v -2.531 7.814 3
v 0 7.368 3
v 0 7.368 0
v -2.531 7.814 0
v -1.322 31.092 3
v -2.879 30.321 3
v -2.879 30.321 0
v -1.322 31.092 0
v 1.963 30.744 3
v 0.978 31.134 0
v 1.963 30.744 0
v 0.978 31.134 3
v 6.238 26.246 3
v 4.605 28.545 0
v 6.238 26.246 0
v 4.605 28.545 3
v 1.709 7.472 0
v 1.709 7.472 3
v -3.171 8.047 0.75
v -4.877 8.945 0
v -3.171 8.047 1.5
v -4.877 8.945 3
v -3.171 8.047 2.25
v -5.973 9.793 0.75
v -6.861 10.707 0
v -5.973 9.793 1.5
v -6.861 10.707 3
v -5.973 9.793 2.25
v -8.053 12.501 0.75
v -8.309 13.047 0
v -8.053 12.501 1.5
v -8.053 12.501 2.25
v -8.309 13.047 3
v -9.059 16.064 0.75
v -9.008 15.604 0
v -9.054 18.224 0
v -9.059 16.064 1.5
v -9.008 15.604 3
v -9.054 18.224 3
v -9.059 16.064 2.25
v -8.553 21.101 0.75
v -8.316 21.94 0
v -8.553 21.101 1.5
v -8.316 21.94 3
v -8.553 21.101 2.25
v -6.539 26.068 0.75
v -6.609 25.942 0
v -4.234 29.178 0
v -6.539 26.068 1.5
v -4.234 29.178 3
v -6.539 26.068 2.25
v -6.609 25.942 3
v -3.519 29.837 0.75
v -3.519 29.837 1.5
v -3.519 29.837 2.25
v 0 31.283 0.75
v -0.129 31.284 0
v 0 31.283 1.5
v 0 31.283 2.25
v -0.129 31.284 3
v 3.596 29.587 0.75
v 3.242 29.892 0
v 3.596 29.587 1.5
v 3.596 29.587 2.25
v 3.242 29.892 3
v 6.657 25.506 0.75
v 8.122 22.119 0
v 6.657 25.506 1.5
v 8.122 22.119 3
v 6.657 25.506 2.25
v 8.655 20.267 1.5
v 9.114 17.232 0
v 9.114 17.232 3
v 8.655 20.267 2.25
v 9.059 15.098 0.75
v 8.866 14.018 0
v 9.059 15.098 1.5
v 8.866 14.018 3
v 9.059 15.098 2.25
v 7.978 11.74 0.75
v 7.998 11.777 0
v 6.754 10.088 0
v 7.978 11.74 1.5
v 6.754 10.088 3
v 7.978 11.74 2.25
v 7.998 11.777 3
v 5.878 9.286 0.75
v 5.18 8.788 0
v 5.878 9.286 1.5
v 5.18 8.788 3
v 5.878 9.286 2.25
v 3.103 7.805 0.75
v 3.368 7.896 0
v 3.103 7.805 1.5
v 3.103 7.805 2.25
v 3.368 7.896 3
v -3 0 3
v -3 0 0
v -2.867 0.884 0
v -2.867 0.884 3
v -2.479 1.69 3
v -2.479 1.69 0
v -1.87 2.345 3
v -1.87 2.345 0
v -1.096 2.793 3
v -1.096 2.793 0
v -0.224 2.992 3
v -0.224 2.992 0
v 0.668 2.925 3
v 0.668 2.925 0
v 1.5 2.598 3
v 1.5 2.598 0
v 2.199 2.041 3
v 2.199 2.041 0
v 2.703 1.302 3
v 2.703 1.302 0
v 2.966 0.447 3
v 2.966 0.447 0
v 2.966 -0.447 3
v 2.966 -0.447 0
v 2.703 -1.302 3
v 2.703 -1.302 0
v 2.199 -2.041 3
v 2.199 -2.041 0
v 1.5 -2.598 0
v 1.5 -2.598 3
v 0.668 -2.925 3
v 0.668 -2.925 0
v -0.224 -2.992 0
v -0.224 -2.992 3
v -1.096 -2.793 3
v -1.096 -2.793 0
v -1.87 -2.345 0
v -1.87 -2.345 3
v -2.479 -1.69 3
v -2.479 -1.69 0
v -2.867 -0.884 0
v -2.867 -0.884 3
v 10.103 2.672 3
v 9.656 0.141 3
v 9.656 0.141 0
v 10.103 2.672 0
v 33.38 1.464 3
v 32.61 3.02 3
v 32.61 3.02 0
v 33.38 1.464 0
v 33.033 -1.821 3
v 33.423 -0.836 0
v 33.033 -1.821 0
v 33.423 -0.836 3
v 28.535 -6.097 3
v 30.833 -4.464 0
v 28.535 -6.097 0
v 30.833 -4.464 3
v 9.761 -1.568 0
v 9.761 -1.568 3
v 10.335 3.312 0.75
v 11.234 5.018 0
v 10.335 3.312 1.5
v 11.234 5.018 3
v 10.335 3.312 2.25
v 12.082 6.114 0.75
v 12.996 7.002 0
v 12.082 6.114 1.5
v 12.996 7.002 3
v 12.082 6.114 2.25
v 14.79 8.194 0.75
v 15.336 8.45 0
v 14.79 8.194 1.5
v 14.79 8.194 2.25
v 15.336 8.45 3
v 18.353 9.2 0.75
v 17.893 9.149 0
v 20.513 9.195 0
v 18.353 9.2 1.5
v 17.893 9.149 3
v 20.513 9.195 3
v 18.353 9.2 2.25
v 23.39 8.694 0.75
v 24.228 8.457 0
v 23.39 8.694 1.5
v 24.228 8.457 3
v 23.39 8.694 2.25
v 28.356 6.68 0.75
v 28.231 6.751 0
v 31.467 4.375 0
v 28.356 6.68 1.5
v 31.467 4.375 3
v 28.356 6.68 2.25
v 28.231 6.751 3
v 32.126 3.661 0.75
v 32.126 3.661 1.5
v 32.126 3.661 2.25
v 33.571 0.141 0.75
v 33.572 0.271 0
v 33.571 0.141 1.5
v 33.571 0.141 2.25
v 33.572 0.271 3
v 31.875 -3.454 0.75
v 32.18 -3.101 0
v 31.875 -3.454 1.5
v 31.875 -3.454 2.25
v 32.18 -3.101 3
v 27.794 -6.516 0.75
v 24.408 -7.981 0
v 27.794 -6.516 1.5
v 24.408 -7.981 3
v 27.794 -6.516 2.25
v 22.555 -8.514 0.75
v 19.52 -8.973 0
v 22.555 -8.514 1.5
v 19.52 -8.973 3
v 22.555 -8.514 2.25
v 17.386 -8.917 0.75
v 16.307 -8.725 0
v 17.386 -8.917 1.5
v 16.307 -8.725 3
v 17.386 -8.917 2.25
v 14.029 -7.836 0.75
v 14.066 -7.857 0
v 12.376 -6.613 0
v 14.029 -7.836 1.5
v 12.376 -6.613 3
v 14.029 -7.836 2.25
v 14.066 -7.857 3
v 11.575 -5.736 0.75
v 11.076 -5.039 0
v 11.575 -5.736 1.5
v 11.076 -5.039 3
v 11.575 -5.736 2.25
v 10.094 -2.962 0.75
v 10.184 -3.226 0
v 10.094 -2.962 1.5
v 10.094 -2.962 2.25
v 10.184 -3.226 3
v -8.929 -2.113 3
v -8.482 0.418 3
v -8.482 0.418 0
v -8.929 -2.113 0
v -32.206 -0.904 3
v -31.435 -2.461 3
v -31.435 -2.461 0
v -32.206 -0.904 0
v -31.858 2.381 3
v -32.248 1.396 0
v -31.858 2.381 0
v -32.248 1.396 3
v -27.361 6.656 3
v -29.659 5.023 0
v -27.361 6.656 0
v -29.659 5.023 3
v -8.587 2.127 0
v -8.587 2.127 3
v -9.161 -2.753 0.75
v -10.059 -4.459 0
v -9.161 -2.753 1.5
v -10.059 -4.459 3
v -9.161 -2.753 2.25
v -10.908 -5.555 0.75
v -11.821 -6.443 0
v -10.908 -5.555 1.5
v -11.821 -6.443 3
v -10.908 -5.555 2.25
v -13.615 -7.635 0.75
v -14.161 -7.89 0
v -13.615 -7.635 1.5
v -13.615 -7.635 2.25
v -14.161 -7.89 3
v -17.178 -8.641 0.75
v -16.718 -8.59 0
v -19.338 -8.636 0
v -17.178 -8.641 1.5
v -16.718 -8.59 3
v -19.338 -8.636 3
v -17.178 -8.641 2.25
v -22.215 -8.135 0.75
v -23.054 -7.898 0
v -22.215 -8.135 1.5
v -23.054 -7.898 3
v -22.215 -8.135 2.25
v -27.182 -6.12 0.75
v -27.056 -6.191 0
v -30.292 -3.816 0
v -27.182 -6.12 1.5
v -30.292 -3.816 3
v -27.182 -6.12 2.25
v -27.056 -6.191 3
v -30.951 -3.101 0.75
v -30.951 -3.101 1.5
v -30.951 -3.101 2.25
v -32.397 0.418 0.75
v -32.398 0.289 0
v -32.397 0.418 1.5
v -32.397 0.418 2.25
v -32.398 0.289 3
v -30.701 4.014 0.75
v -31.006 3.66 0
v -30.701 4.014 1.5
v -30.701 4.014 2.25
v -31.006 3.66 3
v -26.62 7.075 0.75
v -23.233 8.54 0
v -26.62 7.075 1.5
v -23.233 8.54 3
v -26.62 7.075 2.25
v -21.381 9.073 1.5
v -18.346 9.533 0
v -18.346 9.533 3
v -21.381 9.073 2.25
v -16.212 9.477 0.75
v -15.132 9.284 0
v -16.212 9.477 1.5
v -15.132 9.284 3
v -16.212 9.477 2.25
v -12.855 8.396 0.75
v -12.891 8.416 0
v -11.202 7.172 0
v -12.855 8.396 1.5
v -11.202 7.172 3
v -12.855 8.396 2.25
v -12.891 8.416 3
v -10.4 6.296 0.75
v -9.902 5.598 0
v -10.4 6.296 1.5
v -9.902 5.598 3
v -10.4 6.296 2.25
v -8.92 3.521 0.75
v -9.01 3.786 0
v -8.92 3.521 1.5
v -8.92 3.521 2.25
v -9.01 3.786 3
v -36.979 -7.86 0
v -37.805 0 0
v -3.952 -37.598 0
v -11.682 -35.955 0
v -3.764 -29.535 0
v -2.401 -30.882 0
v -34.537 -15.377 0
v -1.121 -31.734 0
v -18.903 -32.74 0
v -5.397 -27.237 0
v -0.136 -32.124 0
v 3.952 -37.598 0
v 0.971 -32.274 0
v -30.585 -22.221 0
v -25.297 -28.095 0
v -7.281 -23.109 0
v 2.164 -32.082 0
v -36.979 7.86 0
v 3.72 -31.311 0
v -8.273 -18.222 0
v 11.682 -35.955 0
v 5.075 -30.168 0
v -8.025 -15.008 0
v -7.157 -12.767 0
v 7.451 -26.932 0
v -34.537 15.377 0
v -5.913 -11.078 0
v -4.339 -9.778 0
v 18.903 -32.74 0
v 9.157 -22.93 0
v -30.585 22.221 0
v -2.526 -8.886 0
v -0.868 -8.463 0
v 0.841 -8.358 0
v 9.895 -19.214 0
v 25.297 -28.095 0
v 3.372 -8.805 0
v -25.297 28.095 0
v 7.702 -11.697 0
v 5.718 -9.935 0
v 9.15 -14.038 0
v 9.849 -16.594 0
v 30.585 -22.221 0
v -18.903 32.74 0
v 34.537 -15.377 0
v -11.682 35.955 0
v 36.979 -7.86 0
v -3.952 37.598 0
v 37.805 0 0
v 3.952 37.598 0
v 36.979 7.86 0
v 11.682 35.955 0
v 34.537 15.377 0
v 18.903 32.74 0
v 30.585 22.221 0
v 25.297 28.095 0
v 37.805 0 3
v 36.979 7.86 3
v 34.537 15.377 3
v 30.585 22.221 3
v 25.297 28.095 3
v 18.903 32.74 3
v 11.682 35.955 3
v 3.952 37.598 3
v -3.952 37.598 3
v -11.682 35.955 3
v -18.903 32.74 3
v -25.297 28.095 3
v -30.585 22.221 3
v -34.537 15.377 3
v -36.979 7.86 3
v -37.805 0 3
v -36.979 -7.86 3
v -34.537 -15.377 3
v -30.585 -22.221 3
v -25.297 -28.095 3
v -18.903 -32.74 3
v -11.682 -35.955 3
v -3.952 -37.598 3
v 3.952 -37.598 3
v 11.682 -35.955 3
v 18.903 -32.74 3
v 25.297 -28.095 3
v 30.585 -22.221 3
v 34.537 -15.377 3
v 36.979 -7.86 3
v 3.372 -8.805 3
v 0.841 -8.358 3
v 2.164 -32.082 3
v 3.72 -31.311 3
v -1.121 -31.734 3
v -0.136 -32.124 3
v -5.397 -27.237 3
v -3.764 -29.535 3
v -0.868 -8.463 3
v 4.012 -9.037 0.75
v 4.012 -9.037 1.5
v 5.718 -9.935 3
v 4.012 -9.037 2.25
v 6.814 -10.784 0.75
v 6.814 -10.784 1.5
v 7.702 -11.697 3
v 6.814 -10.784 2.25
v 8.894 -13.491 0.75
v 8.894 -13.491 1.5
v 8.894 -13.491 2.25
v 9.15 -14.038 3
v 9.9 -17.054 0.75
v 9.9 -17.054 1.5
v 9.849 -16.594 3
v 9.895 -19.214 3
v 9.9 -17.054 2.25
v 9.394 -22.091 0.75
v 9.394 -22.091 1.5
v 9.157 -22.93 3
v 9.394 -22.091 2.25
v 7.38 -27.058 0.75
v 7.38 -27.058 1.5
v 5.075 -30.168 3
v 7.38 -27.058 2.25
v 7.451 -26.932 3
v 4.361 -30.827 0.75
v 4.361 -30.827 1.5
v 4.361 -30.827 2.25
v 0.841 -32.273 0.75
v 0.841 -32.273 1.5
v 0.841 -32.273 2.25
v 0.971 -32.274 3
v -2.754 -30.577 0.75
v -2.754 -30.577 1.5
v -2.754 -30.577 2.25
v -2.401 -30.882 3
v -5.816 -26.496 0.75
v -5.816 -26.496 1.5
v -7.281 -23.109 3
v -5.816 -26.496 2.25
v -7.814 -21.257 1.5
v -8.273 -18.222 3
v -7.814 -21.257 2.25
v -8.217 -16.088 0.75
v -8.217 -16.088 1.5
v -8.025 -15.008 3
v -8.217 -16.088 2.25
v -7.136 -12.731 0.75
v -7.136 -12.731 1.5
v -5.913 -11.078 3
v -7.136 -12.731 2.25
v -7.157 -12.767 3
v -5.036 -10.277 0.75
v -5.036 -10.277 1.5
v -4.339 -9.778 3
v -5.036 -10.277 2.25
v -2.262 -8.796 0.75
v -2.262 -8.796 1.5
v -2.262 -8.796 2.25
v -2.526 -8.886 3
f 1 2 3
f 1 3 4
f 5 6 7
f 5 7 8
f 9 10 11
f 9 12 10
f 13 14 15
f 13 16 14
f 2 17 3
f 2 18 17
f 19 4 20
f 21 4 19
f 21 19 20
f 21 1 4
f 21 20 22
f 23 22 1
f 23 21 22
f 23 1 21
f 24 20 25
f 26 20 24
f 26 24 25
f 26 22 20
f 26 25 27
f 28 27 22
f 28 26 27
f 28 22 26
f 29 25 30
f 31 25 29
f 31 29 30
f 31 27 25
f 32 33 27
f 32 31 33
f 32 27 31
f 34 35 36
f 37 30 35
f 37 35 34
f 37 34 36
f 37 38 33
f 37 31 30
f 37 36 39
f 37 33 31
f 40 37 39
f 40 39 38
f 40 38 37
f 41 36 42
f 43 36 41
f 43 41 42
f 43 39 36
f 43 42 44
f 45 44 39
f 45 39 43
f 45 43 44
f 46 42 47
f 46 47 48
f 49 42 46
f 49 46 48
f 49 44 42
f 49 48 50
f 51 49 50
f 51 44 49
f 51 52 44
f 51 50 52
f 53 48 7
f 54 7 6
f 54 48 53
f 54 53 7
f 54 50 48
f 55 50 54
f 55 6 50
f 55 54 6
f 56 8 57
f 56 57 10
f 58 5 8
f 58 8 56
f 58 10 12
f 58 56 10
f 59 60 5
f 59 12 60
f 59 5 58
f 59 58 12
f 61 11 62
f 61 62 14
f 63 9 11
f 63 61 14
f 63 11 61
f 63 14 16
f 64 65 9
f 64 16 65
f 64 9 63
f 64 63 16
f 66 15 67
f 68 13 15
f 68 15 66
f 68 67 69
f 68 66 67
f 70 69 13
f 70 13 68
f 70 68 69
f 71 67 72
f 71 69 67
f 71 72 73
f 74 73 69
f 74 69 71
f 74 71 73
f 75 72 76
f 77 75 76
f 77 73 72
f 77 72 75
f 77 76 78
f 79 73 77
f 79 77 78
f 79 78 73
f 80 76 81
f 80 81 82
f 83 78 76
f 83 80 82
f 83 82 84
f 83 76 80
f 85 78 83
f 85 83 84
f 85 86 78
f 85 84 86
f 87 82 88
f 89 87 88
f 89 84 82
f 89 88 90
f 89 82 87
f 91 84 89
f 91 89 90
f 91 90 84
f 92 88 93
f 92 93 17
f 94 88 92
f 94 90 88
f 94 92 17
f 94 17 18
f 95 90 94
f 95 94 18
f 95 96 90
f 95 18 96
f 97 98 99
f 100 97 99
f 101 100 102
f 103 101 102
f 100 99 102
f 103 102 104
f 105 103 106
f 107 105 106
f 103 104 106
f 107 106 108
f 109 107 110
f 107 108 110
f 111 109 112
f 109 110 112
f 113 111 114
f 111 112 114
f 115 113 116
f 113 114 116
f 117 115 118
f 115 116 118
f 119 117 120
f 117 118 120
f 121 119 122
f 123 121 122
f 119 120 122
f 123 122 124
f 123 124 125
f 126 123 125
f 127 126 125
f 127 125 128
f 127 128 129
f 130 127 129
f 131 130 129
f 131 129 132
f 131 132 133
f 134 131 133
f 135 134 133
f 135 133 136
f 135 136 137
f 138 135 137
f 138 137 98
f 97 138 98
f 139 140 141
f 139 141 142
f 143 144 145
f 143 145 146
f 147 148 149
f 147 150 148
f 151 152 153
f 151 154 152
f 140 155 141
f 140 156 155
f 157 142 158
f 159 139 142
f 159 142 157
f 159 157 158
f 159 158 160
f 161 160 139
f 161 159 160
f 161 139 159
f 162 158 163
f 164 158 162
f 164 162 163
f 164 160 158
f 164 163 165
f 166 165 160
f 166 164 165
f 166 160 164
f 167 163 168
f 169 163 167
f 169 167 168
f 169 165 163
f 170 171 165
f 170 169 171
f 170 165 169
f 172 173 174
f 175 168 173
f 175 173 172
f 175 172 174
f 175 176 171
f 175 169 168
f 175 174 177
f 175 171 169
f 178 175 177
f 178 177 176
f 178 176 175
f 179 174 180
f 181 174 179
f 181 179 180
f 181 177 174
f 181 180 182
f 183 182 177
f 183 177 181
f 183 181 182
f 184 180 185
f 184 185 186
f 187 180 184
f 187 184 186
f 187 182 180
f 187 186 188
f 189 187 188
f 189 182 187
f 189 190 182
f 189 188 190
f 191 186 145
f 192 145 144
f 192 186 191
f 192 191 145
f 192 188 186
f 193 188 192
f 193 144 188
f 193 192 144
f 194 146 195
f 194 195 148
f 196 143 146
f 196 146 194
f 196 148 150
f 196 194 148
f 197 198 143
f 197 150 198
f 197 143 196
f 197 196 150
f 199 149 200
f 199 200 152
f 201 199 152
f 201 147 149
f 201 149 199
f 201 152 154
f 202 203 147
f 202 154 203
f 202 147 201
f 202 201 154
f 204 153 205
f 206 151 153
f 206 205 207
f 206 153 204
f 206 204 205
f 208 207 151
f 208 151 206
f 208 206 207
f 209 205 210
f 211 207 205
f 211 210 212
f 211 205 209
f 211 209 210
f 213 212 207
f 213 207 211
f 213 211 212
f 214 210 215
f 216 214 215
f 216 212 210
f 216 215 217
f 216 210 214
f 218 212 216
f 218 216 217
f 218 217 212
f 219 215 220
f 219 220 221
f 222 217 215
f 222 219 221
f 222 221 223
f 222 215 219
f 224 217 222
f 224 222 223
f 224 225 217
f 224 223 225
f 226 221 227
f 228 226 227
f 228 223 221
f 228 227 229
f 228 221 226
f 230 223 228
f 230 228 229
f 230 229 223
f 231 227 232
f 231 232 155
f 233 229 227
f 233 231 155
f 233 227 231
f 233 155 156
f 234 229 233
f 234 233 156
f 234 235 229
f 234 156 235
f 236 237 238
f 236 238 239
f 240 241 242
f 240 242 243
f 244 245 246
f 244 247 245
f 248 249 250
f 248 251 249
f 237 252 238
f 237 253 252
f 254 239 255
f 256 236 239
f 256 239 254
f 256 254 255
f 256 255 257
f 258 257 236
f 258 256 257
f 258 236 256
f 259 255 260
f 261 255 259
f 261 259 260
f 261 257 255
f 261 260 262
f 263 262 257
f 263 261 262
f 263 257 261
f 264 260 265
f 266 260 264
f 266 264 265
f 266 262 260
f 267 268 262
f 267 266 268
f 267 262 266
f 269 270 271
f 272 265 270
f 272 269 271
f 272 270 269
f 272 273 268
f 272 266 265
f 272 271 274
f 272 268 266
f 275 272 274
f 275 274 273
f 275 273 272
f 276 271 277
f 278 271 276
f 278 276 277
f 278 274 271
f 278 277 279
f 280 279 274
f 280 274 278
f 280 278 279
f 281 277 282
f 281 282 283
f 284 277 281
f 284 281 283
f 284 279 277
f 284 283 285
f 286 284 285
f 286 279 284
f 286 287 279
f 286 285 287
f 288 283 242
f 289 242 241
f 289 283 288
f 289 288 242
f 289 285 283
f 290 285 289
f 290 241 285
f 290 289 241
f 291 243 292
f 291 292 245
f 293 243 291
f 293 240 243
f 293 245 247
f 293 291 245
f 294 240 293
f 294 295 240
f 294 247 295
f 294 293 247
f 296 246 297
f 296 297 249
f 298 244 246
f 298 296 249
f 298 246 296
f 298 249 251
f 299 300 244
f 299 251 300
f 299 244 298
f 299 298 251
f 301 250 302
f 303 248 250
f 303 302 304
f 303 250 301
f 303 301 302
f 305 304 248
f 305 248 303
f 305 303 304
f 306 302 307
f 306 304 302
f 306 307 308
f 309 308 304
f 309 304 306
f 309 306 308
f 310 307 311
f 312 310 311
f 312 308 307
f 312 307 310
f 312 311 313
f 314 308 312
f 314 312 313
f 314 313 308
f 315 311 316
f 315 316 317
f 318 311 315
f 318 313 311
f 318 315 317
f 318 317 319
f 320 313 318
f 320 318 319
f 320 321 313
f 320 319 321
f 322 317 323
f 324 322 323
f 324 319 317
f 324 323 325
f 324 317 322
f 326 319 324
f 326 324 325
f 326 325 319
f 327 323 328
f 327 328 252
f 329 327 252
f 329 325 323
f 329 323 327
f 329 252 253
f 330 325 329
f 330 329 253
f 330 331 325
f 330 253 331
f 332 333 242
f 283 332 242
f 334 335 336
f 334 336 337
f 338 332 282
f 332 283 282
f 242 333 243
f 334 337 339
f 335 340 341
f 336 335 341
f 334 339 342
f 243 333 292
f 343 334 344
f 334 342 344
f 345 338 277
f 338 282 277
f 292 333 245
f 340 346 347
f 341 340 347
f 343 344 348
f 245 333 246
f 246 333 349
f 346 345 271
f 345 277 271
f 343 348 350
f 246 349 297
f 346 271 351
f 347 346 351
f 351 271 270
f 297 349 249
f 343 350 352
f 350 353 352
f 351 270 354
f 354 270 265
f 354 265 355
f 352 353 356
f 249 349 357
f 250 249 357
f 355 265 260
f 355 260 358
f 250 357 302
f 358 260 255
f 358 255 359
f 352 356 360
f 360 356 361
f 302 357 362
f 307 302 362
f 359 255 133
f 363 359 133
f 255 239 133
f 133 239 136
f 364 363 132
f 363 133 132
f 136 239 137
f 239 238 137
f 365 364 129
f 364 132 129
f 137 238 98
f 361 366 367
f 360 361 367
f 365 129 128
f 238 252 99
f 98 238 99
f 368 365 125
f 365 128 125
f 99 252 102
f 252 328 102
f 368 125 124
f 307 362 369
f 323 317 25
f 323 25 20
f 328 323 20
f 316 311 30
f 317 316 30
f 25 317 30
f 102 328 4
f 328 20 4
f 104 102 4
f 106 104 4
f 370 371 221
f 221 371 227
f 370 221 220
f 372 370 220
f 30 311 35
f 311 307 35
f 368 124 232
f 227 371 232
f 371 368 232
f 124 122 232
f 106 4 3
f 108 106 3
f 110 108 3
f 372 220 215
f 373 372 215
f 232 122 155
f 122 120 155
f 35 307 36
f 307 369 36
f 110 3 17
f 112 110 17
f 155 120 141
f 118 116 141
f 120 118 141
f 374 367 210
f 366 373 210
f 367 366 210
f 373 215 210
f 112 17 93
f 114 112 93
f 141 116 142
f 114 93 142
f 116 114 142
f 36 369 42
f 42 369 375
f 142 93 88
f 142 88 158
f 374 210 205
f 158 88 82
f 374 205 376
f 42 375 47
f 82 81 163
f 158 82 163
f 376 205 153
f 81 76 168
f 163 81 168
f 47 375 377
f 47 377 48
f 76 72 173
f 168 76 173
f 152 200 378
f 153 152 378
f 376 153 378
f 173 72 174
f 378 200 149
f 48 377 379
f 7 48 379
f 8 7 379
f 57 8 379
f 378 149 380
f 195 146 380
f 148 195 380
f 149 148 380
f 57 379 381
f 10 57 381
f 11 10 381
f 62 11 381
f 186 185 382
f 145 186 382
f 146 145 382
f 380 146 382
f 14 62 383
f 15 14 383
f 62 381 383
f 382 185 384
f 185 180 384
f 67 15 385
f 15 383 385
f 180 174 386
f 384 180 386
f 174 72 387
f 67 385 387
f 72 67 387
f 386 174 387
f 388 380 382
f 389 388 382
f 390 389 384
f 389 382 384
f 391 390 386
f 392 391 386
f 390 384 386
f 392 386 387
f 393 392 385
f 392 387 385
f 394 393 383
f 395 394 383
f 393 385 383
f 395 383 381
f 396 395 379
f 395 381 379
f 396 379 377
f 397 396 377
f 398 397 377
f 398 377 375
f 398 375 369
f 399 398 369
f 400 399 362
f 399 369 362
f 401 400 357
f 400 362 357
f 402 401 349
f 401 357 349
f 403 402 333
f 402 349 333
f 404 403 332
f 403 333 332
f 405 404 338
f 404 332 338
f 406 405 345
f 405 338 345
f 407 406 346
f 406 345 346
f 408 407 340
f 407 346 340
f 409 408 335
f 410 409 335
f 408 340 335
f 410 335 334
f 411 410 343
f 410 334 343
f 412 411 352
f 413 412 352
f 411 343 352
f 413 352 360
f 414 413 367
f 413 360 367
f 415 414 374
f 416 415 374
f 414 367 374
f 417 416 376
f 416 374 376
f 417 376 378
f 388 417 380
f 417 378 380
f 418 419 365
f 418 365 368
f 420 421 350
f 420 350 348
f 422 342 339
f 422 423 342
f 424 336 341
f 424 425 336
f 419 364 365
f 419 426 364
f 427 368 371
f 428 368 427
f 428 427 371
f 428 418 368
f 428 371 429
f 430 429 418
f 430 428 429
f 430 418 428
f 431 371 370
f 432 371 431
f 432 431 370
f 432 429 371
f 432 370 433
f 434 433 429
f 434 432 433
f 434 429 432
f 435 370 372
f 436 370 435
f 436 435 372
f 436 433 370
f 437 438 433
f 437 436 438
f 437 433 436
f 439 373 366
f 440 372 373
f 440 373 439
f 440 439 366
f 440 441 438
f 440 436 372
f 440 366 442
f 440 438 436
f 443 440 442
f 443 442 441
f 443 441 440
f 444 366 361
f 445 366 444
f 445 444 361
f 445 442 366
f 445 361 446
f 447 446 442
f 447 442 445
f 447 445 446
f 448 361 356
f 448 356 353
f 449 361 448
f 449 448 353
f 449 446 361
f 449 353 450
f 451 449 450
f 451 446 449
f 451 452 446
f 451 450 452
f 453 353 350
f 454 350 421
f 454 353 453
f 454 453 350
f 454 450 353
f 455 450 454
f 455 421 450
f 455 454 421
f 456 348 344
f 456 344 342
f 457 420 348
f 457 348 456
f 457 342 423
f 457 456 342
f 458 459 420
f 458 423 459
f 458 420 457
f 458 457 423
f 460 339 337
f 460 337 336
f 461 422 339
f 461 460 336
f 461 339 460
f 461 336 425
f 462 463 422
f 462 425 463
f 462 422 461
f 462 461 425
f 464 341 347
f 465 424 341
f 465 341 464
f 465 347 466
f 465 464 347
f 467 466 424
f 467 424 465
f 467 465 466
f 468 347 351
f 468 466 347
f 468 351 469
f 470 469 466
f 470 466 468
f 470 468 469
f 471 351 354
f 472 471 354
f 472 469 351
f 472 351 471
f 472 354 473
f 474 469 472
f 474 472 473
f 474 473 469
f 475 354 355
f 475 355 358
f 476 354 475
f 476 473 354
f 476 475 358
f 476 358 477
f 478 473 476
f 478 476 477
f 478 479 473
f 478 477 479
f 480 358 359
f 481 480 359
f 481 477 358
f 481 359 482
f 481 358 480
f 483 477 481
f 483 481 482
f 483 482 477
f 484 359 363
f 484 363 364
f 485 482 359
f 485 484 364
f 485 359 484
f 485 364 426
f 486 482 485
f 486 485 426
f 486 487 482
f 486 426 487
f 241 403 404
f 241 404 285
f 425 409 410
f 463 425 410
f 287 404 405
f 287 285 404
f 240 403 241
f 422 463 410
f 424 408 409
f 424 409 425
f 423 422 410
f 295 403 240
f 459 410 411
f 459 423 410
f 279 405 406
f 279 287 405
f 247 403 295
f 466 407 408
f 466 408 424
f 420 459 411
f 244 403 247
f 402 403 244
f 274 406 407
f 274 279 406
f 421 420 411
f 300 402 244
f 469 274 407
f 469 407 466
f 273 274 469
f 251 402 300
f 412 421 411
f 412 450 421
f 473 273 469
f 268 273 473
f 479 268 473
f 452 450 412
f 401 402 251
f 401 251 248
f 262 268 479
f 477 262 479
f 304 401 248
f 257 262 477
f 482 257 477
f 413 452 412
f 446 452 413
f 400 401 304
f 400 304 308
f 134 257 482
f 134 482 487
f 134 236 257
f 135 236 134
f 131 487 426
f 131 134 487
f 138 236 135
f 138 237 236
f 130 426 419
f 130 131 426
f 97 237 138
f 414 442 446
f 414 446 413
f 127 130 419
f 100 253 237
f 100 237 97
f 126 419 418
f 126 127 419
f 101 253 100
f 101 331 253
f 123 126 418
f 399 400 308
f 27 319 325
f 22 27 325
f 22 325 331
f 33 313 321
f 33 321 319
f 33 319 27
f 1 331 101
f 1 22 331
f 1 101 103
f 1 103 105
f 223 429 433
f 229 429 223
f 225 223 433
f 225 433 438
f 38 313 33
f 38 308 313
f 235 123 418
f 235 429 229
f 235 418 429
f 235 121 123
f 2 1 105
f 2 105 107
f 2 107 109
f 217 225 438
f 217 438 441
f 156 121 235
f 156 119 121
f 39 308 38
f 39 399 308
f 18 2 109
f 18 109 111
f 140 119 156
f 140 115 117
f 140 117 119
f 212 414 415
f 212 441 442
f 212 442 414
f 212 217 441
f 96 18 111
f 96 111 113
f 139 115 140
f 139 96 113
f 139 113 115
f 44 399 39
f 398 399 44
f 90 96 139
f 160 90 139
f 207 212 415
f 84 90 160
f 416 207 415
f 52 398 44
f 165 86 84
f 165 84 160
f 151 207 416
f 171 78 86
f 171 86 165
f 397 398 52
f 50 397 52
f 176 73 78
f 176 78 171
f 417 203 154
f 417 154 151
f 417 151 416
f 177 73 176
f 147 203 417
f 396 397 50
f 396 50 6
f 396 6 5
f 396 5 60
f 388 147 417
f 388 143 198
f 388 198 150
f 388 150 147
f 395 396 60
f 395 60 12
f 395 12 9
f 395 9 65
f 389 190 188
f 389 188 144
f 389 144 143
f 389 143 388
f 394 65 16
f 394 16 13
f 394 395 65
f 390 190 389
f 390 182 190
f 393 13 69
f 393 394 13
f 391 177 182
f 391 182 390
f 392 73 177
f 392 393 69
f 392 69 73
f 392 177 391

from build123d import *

# Parameters (mm, degrees)
F0_R     = 37.8050267404
F1_DEPTH = 3
F3_D     = 6
F5_DEPTH = 3


with BuildPart() as f1:
    # F0 (on Top) → F1 (new body)
    with BuildSketch(Plane.XY):
        Circle(F0_R)
    extrude(amount=F1_DEPTH)

    # F3 (through all)
    with Locations(Plane.XY.offset(3)):
        with Locations((0, 0)):
            Hole(F3_D / 2)

    # F4 (on face) → F5 (cut)
    with BuildSketch(Plane.XY.offset(3)):
        with BuildLine():
            add(Edge.make_bspline(
                [(0, 7.3677147739), (-4.3172130985, 7.5143755854), (-13.6661611311, 14.6820454611), (0.12214911, 40.695215941), (13.7482012339, 13.5762134247), (4.2042141951, 7.2248926681), (0, 7.3677147739)],
                knots=[0, 0, 0, 0, 0.2284800069, 0.499821664, 0.7775002377, 1, 1, 1, 1], degree=3))
        make_face()
        with BuildLine():
            add(Edge.make_bspline(
                [(-8.4818354808, 0.4180464894), (-8.6284962923, -3.8991666092), (-15.796166168, -13.2481146417), (-41.8093366479, 0.5401955994), (-14.6903341316, 14.1662477233), (-8.339013375, 4.6222606845), (-8.4818354808, 0.4180464894)],
                knots=[0, 0, 0, 0, 0.2284800069, 0.499821664, 0.7775002377, 1, 1, 1, 1], degree=3))
        make_face()
        with BuildLine():
            add(Edge.make_bspline(
                [(0.8413353935, -8.3578969352), (5.158548492, -8.5045577467), (14.5074965246, -15.6722276224), (0.7191862834, -41.6853981023), (-12.9068658404, -14.566395586), (-3.3628788016, -8.2150748295), (0.8413353935, -8.3578969352)],
                knots=[0, 0, 0, 0, 0.2284800069, 0.499821664, 0.7775002377, 1, 1, 1, 1], degree=3))
        make_face()
        with BuildLine():
            add(Edge.make_bspline(
                [(9.6563412808, 0.14133472), (9.8030020923, 4.4585478185), (16.970671968, 13.807495851), (42.9838424479, 0.0191856099), (15.8648399316, -13.606866514), (9.513519175, -4.0628794752), (9.6563412808, 0.14133472)],
                knots=[0, 0, 0, 0, 0.2284800069, 0.499821664, 0.7775002377, 1, 1, 1, 1], degree=3))
        make_face()
    extrude(amount=-F5_DEPTH, mode=Mode.SUBTRACT)


solid = f1.part
